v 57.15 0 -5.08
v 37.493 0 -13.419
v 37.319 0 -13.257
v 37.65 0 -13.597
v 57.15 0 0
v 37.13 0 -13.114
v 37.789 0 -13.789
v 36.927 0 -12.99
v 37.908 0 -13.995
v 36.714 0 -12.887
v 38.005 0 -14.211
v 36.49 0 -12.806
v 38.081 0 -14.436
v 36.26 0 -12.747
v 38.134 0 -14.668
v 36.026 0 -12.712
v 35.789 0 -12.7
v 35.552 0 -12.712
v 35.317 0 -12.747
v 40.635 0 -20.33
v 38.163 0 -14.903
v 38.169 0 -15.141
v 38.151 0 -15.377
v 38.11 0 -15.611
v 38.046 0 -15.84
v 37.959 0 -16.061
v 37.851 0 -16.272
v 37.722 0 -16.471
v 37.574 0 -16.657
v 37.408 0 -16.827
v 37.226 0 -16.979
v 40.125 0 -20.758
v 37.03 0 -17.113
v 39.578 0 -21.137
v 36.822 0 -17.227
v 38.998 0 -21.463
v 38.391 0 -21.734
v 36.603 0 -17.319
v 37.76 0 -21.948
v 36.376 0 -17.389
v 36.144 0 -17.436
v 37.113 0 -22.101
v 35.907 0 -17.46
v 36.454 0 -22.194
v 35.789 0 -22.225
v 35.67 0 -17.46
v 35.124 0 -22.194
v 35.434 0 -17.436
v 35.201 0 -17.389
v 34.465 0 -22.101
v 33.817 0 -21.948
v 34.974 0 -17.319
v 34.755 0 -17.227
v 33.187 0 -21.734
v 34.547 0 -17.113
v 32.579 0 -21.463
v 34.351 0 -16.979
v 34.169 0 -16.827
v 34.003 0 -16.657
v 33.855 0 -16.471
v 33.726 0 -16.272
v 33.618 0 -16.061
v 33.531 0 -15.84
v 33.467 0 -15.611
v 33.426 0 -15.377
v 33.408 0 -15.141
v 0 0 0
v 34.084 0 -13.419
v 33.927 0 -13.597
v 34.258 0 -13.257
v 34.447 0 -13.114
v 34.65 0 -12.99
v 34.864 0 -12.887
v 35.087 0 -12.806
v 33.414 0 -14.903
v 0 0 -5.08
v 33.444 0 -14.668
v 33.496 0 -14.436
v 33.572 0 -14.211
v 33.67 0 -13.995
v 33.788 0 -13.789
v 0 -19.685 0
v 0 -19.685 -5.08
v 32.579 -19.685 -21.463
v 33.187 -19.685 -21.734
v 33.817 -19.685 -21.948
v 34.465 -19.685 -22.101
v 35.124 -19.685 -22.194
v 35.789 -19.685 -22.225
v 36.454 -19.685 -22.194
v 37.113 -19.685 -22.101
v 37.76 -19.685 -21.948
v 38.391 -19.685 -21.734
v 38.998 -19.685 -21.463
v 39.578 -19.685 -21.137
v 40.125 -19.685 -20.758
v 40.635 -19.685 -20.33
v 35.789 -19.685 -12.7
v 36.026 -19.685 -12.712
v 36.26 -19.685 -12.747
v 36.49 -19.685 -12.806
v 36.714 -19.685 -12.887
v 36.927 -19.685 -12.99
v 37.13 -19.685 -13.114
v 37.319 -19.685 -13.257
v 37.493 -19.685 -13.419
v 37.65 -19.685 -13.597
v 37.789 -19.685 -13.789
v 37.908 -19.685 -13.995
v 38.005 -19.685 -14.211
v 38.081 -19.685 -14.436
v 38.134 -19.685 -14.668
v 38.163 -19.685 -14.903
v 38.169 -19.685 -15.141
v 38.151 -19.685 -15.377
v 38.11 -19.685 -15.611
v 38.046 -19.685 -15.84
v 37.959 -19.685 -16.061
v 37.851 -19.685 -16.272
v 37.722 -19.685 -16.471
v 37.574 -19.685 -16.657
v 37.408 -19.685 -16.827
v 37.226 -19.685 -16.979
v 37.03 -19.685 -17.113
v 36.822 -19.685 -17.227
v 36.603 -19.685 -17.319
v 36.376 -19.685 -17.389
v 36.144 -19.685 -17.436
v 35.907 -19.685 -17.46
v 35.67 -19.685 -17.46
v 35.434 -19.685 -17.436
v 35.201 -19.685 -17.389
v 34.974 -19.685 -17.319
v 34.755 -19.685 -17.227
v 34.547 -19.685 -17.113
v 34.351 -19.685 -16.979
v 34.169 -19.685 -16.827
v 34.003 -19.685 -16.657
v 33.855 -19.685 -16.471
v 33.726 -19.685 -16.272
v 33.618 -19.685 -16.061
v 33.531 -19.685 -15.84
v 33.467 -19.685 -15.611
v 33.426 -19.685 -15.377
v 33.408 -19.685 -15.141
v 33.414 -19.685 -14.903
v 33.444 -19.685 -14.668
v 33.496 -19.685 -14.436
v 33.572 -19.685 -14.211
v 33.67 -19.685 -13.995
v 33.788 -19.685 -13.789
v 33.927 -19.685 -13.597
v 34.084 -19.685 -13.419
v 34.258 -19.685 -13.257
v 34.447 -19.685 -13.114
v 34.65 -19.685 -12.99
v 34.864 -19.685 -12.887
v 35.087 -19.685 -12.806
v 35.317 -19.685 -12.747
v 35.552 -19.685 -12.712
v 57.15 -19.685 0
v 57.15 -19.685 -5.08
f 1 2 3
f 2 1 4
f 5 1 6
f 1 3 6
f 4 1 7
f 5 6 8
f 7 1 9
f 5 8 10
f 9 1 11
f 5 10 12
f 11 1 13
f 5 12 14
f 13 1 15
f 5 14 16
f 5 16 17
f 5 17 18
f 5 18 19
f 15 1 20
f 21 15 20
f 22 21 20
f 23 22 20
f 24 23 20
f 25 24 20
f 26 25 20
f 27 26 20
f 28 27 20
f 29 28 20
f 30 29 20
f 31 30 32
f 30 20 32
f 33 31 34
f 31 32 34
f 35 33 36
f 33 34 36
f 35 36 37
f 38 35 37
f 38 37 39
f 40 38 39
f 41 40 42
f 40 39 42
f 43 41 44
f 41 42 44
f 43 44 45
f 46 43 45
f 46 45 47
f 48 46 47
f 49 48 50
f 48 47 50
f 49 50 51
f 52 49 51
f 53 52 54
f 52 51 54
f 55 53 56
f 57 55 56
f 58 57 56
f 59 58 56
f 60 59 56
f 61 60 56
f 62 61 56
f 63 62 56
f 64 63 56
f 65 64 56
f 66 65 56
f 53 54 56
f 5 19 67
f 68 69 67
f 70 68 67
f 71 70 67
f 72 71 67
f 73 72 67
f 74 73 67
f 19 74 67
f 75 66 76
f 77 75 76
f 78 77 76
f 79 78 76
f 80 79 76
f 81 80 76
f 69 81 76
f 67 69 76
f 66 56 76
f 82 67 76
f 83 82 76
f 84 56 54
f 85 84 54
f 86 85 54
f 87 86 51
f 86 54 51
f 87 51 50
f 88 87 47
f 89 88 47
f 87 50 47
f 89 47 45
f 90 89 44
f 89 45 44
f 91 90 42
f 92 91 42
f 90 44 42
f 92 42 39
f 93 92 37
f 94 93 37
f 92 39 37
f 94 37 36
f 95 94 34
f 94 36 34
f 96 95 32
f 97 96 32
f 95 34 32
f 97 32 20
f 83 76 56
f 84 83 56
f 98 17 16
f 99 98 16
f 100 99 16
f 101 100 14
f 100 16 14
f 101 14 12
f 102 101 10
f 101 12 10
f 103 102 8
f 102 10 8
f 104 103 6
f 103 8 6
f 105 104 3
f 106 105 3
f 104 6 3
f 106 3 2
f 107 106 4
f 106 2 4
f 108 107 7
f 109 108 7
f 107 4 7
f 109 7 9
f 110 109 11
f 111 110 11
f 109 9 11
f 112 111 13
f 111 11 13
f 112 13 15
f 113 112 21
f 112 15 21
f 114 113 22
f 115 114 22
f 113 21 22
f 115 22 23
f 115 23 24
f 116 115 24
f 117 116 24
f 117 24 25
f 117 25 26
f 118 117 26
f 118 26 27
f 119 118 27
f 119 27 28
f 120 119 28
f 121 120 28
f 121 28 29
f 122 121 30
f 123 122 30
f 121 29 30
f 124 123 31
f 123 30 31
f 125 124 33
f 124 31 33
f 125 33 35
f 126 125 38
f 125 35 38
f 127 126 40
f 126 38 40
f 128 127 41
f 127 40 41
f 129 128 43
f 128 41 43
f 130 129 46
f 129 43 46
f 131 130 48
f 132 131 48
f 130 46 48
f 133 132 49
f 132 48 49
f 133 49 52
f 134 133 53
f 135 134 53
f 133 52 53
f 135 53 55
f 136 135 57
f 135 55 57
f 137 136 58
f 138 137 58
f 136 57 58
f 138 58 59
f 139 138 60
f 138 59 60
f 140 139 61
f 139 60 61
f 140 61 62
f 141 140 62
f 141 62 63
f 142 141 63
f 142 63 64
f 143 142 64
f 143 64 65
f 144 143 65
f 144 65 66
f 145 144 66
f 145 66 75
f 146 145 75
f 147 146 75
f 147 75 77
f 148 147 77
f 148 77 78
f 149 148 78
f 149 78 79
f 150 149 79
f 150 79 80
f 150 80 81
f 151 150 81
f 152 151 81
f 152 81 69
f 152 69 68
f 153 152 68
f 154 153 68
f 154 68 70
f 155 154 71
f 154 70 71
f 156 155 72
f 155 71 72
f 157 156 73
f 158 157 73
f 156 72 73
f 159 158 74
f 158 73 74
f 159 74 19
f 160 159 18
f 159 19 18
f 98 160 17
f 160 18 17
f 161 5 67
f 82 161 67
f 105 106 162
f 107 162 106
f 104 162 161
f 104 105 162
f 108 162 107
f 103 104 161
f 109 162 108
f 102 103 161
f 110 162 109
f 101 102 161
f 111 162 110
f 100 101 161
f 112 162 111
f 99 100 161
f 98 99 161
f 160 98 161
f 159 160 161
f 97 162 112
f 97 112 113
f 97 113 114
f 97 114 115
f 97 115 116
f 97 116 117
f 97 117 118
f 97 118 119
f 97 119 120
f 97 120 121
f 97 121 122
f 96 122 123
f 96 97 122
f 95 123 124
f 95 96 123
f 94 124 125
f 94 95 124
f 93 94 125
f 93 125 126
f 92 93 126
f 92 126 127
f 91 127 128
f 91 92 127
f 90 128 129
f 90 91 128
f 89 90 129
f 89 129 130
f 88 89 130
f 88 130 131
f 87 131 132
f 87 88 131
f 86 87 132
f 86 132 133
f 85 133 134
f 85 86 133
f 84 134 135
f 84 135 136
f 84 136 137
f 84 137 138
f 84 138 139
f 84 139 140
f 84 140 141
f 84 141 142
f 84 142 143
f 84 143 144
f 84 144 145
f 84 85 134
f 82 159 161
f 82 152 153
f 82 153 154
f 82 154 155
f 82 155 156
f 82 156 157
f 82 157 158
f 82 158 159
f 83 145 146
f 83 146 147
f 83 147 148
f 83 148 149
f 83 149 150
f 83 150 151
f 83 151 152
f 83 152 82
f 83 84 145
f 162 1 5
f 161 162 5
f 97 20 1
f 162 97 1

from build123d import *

# Parameters (mm, degrees)
SKETCH1_R           = 2.38125
BOSS_EXTRUDE1_DEPTH = 19.685


with BuildPart() as part:
    # Sketch1 → Boss-Extrude1 (new body)
    with BuildSketch(Plane(origin=(0, 0, 0), x_dir=(1, 0, 0), z_dir=(0, 1, 0))):
        with BuildLine():
            Line((0, 5.08), (32.579112959, 21.463440611))
            ThreePointArc((32.579112959, 21.463440611), (36.78416415, 22.155288174), (40.634925166, 20.329706577))
            Line((40.634925166, 20.329706577), (57.15, 5.08))
            Line((57.15, 5.08), (57.15, 0))
            Line((57.15, 0), (0, 0))
            Line((0, 0), (0, 5.08))
        make_face()
        with Locations(Location((35.7886, 15.08125, 0), (0, 0, 270))):
            Circle(SKETCH1_R, mode=Mode.SUBTRACT)
    extrude(amount=-BOSS_EXTRUDE1_DEPTH)


solid = part.part
